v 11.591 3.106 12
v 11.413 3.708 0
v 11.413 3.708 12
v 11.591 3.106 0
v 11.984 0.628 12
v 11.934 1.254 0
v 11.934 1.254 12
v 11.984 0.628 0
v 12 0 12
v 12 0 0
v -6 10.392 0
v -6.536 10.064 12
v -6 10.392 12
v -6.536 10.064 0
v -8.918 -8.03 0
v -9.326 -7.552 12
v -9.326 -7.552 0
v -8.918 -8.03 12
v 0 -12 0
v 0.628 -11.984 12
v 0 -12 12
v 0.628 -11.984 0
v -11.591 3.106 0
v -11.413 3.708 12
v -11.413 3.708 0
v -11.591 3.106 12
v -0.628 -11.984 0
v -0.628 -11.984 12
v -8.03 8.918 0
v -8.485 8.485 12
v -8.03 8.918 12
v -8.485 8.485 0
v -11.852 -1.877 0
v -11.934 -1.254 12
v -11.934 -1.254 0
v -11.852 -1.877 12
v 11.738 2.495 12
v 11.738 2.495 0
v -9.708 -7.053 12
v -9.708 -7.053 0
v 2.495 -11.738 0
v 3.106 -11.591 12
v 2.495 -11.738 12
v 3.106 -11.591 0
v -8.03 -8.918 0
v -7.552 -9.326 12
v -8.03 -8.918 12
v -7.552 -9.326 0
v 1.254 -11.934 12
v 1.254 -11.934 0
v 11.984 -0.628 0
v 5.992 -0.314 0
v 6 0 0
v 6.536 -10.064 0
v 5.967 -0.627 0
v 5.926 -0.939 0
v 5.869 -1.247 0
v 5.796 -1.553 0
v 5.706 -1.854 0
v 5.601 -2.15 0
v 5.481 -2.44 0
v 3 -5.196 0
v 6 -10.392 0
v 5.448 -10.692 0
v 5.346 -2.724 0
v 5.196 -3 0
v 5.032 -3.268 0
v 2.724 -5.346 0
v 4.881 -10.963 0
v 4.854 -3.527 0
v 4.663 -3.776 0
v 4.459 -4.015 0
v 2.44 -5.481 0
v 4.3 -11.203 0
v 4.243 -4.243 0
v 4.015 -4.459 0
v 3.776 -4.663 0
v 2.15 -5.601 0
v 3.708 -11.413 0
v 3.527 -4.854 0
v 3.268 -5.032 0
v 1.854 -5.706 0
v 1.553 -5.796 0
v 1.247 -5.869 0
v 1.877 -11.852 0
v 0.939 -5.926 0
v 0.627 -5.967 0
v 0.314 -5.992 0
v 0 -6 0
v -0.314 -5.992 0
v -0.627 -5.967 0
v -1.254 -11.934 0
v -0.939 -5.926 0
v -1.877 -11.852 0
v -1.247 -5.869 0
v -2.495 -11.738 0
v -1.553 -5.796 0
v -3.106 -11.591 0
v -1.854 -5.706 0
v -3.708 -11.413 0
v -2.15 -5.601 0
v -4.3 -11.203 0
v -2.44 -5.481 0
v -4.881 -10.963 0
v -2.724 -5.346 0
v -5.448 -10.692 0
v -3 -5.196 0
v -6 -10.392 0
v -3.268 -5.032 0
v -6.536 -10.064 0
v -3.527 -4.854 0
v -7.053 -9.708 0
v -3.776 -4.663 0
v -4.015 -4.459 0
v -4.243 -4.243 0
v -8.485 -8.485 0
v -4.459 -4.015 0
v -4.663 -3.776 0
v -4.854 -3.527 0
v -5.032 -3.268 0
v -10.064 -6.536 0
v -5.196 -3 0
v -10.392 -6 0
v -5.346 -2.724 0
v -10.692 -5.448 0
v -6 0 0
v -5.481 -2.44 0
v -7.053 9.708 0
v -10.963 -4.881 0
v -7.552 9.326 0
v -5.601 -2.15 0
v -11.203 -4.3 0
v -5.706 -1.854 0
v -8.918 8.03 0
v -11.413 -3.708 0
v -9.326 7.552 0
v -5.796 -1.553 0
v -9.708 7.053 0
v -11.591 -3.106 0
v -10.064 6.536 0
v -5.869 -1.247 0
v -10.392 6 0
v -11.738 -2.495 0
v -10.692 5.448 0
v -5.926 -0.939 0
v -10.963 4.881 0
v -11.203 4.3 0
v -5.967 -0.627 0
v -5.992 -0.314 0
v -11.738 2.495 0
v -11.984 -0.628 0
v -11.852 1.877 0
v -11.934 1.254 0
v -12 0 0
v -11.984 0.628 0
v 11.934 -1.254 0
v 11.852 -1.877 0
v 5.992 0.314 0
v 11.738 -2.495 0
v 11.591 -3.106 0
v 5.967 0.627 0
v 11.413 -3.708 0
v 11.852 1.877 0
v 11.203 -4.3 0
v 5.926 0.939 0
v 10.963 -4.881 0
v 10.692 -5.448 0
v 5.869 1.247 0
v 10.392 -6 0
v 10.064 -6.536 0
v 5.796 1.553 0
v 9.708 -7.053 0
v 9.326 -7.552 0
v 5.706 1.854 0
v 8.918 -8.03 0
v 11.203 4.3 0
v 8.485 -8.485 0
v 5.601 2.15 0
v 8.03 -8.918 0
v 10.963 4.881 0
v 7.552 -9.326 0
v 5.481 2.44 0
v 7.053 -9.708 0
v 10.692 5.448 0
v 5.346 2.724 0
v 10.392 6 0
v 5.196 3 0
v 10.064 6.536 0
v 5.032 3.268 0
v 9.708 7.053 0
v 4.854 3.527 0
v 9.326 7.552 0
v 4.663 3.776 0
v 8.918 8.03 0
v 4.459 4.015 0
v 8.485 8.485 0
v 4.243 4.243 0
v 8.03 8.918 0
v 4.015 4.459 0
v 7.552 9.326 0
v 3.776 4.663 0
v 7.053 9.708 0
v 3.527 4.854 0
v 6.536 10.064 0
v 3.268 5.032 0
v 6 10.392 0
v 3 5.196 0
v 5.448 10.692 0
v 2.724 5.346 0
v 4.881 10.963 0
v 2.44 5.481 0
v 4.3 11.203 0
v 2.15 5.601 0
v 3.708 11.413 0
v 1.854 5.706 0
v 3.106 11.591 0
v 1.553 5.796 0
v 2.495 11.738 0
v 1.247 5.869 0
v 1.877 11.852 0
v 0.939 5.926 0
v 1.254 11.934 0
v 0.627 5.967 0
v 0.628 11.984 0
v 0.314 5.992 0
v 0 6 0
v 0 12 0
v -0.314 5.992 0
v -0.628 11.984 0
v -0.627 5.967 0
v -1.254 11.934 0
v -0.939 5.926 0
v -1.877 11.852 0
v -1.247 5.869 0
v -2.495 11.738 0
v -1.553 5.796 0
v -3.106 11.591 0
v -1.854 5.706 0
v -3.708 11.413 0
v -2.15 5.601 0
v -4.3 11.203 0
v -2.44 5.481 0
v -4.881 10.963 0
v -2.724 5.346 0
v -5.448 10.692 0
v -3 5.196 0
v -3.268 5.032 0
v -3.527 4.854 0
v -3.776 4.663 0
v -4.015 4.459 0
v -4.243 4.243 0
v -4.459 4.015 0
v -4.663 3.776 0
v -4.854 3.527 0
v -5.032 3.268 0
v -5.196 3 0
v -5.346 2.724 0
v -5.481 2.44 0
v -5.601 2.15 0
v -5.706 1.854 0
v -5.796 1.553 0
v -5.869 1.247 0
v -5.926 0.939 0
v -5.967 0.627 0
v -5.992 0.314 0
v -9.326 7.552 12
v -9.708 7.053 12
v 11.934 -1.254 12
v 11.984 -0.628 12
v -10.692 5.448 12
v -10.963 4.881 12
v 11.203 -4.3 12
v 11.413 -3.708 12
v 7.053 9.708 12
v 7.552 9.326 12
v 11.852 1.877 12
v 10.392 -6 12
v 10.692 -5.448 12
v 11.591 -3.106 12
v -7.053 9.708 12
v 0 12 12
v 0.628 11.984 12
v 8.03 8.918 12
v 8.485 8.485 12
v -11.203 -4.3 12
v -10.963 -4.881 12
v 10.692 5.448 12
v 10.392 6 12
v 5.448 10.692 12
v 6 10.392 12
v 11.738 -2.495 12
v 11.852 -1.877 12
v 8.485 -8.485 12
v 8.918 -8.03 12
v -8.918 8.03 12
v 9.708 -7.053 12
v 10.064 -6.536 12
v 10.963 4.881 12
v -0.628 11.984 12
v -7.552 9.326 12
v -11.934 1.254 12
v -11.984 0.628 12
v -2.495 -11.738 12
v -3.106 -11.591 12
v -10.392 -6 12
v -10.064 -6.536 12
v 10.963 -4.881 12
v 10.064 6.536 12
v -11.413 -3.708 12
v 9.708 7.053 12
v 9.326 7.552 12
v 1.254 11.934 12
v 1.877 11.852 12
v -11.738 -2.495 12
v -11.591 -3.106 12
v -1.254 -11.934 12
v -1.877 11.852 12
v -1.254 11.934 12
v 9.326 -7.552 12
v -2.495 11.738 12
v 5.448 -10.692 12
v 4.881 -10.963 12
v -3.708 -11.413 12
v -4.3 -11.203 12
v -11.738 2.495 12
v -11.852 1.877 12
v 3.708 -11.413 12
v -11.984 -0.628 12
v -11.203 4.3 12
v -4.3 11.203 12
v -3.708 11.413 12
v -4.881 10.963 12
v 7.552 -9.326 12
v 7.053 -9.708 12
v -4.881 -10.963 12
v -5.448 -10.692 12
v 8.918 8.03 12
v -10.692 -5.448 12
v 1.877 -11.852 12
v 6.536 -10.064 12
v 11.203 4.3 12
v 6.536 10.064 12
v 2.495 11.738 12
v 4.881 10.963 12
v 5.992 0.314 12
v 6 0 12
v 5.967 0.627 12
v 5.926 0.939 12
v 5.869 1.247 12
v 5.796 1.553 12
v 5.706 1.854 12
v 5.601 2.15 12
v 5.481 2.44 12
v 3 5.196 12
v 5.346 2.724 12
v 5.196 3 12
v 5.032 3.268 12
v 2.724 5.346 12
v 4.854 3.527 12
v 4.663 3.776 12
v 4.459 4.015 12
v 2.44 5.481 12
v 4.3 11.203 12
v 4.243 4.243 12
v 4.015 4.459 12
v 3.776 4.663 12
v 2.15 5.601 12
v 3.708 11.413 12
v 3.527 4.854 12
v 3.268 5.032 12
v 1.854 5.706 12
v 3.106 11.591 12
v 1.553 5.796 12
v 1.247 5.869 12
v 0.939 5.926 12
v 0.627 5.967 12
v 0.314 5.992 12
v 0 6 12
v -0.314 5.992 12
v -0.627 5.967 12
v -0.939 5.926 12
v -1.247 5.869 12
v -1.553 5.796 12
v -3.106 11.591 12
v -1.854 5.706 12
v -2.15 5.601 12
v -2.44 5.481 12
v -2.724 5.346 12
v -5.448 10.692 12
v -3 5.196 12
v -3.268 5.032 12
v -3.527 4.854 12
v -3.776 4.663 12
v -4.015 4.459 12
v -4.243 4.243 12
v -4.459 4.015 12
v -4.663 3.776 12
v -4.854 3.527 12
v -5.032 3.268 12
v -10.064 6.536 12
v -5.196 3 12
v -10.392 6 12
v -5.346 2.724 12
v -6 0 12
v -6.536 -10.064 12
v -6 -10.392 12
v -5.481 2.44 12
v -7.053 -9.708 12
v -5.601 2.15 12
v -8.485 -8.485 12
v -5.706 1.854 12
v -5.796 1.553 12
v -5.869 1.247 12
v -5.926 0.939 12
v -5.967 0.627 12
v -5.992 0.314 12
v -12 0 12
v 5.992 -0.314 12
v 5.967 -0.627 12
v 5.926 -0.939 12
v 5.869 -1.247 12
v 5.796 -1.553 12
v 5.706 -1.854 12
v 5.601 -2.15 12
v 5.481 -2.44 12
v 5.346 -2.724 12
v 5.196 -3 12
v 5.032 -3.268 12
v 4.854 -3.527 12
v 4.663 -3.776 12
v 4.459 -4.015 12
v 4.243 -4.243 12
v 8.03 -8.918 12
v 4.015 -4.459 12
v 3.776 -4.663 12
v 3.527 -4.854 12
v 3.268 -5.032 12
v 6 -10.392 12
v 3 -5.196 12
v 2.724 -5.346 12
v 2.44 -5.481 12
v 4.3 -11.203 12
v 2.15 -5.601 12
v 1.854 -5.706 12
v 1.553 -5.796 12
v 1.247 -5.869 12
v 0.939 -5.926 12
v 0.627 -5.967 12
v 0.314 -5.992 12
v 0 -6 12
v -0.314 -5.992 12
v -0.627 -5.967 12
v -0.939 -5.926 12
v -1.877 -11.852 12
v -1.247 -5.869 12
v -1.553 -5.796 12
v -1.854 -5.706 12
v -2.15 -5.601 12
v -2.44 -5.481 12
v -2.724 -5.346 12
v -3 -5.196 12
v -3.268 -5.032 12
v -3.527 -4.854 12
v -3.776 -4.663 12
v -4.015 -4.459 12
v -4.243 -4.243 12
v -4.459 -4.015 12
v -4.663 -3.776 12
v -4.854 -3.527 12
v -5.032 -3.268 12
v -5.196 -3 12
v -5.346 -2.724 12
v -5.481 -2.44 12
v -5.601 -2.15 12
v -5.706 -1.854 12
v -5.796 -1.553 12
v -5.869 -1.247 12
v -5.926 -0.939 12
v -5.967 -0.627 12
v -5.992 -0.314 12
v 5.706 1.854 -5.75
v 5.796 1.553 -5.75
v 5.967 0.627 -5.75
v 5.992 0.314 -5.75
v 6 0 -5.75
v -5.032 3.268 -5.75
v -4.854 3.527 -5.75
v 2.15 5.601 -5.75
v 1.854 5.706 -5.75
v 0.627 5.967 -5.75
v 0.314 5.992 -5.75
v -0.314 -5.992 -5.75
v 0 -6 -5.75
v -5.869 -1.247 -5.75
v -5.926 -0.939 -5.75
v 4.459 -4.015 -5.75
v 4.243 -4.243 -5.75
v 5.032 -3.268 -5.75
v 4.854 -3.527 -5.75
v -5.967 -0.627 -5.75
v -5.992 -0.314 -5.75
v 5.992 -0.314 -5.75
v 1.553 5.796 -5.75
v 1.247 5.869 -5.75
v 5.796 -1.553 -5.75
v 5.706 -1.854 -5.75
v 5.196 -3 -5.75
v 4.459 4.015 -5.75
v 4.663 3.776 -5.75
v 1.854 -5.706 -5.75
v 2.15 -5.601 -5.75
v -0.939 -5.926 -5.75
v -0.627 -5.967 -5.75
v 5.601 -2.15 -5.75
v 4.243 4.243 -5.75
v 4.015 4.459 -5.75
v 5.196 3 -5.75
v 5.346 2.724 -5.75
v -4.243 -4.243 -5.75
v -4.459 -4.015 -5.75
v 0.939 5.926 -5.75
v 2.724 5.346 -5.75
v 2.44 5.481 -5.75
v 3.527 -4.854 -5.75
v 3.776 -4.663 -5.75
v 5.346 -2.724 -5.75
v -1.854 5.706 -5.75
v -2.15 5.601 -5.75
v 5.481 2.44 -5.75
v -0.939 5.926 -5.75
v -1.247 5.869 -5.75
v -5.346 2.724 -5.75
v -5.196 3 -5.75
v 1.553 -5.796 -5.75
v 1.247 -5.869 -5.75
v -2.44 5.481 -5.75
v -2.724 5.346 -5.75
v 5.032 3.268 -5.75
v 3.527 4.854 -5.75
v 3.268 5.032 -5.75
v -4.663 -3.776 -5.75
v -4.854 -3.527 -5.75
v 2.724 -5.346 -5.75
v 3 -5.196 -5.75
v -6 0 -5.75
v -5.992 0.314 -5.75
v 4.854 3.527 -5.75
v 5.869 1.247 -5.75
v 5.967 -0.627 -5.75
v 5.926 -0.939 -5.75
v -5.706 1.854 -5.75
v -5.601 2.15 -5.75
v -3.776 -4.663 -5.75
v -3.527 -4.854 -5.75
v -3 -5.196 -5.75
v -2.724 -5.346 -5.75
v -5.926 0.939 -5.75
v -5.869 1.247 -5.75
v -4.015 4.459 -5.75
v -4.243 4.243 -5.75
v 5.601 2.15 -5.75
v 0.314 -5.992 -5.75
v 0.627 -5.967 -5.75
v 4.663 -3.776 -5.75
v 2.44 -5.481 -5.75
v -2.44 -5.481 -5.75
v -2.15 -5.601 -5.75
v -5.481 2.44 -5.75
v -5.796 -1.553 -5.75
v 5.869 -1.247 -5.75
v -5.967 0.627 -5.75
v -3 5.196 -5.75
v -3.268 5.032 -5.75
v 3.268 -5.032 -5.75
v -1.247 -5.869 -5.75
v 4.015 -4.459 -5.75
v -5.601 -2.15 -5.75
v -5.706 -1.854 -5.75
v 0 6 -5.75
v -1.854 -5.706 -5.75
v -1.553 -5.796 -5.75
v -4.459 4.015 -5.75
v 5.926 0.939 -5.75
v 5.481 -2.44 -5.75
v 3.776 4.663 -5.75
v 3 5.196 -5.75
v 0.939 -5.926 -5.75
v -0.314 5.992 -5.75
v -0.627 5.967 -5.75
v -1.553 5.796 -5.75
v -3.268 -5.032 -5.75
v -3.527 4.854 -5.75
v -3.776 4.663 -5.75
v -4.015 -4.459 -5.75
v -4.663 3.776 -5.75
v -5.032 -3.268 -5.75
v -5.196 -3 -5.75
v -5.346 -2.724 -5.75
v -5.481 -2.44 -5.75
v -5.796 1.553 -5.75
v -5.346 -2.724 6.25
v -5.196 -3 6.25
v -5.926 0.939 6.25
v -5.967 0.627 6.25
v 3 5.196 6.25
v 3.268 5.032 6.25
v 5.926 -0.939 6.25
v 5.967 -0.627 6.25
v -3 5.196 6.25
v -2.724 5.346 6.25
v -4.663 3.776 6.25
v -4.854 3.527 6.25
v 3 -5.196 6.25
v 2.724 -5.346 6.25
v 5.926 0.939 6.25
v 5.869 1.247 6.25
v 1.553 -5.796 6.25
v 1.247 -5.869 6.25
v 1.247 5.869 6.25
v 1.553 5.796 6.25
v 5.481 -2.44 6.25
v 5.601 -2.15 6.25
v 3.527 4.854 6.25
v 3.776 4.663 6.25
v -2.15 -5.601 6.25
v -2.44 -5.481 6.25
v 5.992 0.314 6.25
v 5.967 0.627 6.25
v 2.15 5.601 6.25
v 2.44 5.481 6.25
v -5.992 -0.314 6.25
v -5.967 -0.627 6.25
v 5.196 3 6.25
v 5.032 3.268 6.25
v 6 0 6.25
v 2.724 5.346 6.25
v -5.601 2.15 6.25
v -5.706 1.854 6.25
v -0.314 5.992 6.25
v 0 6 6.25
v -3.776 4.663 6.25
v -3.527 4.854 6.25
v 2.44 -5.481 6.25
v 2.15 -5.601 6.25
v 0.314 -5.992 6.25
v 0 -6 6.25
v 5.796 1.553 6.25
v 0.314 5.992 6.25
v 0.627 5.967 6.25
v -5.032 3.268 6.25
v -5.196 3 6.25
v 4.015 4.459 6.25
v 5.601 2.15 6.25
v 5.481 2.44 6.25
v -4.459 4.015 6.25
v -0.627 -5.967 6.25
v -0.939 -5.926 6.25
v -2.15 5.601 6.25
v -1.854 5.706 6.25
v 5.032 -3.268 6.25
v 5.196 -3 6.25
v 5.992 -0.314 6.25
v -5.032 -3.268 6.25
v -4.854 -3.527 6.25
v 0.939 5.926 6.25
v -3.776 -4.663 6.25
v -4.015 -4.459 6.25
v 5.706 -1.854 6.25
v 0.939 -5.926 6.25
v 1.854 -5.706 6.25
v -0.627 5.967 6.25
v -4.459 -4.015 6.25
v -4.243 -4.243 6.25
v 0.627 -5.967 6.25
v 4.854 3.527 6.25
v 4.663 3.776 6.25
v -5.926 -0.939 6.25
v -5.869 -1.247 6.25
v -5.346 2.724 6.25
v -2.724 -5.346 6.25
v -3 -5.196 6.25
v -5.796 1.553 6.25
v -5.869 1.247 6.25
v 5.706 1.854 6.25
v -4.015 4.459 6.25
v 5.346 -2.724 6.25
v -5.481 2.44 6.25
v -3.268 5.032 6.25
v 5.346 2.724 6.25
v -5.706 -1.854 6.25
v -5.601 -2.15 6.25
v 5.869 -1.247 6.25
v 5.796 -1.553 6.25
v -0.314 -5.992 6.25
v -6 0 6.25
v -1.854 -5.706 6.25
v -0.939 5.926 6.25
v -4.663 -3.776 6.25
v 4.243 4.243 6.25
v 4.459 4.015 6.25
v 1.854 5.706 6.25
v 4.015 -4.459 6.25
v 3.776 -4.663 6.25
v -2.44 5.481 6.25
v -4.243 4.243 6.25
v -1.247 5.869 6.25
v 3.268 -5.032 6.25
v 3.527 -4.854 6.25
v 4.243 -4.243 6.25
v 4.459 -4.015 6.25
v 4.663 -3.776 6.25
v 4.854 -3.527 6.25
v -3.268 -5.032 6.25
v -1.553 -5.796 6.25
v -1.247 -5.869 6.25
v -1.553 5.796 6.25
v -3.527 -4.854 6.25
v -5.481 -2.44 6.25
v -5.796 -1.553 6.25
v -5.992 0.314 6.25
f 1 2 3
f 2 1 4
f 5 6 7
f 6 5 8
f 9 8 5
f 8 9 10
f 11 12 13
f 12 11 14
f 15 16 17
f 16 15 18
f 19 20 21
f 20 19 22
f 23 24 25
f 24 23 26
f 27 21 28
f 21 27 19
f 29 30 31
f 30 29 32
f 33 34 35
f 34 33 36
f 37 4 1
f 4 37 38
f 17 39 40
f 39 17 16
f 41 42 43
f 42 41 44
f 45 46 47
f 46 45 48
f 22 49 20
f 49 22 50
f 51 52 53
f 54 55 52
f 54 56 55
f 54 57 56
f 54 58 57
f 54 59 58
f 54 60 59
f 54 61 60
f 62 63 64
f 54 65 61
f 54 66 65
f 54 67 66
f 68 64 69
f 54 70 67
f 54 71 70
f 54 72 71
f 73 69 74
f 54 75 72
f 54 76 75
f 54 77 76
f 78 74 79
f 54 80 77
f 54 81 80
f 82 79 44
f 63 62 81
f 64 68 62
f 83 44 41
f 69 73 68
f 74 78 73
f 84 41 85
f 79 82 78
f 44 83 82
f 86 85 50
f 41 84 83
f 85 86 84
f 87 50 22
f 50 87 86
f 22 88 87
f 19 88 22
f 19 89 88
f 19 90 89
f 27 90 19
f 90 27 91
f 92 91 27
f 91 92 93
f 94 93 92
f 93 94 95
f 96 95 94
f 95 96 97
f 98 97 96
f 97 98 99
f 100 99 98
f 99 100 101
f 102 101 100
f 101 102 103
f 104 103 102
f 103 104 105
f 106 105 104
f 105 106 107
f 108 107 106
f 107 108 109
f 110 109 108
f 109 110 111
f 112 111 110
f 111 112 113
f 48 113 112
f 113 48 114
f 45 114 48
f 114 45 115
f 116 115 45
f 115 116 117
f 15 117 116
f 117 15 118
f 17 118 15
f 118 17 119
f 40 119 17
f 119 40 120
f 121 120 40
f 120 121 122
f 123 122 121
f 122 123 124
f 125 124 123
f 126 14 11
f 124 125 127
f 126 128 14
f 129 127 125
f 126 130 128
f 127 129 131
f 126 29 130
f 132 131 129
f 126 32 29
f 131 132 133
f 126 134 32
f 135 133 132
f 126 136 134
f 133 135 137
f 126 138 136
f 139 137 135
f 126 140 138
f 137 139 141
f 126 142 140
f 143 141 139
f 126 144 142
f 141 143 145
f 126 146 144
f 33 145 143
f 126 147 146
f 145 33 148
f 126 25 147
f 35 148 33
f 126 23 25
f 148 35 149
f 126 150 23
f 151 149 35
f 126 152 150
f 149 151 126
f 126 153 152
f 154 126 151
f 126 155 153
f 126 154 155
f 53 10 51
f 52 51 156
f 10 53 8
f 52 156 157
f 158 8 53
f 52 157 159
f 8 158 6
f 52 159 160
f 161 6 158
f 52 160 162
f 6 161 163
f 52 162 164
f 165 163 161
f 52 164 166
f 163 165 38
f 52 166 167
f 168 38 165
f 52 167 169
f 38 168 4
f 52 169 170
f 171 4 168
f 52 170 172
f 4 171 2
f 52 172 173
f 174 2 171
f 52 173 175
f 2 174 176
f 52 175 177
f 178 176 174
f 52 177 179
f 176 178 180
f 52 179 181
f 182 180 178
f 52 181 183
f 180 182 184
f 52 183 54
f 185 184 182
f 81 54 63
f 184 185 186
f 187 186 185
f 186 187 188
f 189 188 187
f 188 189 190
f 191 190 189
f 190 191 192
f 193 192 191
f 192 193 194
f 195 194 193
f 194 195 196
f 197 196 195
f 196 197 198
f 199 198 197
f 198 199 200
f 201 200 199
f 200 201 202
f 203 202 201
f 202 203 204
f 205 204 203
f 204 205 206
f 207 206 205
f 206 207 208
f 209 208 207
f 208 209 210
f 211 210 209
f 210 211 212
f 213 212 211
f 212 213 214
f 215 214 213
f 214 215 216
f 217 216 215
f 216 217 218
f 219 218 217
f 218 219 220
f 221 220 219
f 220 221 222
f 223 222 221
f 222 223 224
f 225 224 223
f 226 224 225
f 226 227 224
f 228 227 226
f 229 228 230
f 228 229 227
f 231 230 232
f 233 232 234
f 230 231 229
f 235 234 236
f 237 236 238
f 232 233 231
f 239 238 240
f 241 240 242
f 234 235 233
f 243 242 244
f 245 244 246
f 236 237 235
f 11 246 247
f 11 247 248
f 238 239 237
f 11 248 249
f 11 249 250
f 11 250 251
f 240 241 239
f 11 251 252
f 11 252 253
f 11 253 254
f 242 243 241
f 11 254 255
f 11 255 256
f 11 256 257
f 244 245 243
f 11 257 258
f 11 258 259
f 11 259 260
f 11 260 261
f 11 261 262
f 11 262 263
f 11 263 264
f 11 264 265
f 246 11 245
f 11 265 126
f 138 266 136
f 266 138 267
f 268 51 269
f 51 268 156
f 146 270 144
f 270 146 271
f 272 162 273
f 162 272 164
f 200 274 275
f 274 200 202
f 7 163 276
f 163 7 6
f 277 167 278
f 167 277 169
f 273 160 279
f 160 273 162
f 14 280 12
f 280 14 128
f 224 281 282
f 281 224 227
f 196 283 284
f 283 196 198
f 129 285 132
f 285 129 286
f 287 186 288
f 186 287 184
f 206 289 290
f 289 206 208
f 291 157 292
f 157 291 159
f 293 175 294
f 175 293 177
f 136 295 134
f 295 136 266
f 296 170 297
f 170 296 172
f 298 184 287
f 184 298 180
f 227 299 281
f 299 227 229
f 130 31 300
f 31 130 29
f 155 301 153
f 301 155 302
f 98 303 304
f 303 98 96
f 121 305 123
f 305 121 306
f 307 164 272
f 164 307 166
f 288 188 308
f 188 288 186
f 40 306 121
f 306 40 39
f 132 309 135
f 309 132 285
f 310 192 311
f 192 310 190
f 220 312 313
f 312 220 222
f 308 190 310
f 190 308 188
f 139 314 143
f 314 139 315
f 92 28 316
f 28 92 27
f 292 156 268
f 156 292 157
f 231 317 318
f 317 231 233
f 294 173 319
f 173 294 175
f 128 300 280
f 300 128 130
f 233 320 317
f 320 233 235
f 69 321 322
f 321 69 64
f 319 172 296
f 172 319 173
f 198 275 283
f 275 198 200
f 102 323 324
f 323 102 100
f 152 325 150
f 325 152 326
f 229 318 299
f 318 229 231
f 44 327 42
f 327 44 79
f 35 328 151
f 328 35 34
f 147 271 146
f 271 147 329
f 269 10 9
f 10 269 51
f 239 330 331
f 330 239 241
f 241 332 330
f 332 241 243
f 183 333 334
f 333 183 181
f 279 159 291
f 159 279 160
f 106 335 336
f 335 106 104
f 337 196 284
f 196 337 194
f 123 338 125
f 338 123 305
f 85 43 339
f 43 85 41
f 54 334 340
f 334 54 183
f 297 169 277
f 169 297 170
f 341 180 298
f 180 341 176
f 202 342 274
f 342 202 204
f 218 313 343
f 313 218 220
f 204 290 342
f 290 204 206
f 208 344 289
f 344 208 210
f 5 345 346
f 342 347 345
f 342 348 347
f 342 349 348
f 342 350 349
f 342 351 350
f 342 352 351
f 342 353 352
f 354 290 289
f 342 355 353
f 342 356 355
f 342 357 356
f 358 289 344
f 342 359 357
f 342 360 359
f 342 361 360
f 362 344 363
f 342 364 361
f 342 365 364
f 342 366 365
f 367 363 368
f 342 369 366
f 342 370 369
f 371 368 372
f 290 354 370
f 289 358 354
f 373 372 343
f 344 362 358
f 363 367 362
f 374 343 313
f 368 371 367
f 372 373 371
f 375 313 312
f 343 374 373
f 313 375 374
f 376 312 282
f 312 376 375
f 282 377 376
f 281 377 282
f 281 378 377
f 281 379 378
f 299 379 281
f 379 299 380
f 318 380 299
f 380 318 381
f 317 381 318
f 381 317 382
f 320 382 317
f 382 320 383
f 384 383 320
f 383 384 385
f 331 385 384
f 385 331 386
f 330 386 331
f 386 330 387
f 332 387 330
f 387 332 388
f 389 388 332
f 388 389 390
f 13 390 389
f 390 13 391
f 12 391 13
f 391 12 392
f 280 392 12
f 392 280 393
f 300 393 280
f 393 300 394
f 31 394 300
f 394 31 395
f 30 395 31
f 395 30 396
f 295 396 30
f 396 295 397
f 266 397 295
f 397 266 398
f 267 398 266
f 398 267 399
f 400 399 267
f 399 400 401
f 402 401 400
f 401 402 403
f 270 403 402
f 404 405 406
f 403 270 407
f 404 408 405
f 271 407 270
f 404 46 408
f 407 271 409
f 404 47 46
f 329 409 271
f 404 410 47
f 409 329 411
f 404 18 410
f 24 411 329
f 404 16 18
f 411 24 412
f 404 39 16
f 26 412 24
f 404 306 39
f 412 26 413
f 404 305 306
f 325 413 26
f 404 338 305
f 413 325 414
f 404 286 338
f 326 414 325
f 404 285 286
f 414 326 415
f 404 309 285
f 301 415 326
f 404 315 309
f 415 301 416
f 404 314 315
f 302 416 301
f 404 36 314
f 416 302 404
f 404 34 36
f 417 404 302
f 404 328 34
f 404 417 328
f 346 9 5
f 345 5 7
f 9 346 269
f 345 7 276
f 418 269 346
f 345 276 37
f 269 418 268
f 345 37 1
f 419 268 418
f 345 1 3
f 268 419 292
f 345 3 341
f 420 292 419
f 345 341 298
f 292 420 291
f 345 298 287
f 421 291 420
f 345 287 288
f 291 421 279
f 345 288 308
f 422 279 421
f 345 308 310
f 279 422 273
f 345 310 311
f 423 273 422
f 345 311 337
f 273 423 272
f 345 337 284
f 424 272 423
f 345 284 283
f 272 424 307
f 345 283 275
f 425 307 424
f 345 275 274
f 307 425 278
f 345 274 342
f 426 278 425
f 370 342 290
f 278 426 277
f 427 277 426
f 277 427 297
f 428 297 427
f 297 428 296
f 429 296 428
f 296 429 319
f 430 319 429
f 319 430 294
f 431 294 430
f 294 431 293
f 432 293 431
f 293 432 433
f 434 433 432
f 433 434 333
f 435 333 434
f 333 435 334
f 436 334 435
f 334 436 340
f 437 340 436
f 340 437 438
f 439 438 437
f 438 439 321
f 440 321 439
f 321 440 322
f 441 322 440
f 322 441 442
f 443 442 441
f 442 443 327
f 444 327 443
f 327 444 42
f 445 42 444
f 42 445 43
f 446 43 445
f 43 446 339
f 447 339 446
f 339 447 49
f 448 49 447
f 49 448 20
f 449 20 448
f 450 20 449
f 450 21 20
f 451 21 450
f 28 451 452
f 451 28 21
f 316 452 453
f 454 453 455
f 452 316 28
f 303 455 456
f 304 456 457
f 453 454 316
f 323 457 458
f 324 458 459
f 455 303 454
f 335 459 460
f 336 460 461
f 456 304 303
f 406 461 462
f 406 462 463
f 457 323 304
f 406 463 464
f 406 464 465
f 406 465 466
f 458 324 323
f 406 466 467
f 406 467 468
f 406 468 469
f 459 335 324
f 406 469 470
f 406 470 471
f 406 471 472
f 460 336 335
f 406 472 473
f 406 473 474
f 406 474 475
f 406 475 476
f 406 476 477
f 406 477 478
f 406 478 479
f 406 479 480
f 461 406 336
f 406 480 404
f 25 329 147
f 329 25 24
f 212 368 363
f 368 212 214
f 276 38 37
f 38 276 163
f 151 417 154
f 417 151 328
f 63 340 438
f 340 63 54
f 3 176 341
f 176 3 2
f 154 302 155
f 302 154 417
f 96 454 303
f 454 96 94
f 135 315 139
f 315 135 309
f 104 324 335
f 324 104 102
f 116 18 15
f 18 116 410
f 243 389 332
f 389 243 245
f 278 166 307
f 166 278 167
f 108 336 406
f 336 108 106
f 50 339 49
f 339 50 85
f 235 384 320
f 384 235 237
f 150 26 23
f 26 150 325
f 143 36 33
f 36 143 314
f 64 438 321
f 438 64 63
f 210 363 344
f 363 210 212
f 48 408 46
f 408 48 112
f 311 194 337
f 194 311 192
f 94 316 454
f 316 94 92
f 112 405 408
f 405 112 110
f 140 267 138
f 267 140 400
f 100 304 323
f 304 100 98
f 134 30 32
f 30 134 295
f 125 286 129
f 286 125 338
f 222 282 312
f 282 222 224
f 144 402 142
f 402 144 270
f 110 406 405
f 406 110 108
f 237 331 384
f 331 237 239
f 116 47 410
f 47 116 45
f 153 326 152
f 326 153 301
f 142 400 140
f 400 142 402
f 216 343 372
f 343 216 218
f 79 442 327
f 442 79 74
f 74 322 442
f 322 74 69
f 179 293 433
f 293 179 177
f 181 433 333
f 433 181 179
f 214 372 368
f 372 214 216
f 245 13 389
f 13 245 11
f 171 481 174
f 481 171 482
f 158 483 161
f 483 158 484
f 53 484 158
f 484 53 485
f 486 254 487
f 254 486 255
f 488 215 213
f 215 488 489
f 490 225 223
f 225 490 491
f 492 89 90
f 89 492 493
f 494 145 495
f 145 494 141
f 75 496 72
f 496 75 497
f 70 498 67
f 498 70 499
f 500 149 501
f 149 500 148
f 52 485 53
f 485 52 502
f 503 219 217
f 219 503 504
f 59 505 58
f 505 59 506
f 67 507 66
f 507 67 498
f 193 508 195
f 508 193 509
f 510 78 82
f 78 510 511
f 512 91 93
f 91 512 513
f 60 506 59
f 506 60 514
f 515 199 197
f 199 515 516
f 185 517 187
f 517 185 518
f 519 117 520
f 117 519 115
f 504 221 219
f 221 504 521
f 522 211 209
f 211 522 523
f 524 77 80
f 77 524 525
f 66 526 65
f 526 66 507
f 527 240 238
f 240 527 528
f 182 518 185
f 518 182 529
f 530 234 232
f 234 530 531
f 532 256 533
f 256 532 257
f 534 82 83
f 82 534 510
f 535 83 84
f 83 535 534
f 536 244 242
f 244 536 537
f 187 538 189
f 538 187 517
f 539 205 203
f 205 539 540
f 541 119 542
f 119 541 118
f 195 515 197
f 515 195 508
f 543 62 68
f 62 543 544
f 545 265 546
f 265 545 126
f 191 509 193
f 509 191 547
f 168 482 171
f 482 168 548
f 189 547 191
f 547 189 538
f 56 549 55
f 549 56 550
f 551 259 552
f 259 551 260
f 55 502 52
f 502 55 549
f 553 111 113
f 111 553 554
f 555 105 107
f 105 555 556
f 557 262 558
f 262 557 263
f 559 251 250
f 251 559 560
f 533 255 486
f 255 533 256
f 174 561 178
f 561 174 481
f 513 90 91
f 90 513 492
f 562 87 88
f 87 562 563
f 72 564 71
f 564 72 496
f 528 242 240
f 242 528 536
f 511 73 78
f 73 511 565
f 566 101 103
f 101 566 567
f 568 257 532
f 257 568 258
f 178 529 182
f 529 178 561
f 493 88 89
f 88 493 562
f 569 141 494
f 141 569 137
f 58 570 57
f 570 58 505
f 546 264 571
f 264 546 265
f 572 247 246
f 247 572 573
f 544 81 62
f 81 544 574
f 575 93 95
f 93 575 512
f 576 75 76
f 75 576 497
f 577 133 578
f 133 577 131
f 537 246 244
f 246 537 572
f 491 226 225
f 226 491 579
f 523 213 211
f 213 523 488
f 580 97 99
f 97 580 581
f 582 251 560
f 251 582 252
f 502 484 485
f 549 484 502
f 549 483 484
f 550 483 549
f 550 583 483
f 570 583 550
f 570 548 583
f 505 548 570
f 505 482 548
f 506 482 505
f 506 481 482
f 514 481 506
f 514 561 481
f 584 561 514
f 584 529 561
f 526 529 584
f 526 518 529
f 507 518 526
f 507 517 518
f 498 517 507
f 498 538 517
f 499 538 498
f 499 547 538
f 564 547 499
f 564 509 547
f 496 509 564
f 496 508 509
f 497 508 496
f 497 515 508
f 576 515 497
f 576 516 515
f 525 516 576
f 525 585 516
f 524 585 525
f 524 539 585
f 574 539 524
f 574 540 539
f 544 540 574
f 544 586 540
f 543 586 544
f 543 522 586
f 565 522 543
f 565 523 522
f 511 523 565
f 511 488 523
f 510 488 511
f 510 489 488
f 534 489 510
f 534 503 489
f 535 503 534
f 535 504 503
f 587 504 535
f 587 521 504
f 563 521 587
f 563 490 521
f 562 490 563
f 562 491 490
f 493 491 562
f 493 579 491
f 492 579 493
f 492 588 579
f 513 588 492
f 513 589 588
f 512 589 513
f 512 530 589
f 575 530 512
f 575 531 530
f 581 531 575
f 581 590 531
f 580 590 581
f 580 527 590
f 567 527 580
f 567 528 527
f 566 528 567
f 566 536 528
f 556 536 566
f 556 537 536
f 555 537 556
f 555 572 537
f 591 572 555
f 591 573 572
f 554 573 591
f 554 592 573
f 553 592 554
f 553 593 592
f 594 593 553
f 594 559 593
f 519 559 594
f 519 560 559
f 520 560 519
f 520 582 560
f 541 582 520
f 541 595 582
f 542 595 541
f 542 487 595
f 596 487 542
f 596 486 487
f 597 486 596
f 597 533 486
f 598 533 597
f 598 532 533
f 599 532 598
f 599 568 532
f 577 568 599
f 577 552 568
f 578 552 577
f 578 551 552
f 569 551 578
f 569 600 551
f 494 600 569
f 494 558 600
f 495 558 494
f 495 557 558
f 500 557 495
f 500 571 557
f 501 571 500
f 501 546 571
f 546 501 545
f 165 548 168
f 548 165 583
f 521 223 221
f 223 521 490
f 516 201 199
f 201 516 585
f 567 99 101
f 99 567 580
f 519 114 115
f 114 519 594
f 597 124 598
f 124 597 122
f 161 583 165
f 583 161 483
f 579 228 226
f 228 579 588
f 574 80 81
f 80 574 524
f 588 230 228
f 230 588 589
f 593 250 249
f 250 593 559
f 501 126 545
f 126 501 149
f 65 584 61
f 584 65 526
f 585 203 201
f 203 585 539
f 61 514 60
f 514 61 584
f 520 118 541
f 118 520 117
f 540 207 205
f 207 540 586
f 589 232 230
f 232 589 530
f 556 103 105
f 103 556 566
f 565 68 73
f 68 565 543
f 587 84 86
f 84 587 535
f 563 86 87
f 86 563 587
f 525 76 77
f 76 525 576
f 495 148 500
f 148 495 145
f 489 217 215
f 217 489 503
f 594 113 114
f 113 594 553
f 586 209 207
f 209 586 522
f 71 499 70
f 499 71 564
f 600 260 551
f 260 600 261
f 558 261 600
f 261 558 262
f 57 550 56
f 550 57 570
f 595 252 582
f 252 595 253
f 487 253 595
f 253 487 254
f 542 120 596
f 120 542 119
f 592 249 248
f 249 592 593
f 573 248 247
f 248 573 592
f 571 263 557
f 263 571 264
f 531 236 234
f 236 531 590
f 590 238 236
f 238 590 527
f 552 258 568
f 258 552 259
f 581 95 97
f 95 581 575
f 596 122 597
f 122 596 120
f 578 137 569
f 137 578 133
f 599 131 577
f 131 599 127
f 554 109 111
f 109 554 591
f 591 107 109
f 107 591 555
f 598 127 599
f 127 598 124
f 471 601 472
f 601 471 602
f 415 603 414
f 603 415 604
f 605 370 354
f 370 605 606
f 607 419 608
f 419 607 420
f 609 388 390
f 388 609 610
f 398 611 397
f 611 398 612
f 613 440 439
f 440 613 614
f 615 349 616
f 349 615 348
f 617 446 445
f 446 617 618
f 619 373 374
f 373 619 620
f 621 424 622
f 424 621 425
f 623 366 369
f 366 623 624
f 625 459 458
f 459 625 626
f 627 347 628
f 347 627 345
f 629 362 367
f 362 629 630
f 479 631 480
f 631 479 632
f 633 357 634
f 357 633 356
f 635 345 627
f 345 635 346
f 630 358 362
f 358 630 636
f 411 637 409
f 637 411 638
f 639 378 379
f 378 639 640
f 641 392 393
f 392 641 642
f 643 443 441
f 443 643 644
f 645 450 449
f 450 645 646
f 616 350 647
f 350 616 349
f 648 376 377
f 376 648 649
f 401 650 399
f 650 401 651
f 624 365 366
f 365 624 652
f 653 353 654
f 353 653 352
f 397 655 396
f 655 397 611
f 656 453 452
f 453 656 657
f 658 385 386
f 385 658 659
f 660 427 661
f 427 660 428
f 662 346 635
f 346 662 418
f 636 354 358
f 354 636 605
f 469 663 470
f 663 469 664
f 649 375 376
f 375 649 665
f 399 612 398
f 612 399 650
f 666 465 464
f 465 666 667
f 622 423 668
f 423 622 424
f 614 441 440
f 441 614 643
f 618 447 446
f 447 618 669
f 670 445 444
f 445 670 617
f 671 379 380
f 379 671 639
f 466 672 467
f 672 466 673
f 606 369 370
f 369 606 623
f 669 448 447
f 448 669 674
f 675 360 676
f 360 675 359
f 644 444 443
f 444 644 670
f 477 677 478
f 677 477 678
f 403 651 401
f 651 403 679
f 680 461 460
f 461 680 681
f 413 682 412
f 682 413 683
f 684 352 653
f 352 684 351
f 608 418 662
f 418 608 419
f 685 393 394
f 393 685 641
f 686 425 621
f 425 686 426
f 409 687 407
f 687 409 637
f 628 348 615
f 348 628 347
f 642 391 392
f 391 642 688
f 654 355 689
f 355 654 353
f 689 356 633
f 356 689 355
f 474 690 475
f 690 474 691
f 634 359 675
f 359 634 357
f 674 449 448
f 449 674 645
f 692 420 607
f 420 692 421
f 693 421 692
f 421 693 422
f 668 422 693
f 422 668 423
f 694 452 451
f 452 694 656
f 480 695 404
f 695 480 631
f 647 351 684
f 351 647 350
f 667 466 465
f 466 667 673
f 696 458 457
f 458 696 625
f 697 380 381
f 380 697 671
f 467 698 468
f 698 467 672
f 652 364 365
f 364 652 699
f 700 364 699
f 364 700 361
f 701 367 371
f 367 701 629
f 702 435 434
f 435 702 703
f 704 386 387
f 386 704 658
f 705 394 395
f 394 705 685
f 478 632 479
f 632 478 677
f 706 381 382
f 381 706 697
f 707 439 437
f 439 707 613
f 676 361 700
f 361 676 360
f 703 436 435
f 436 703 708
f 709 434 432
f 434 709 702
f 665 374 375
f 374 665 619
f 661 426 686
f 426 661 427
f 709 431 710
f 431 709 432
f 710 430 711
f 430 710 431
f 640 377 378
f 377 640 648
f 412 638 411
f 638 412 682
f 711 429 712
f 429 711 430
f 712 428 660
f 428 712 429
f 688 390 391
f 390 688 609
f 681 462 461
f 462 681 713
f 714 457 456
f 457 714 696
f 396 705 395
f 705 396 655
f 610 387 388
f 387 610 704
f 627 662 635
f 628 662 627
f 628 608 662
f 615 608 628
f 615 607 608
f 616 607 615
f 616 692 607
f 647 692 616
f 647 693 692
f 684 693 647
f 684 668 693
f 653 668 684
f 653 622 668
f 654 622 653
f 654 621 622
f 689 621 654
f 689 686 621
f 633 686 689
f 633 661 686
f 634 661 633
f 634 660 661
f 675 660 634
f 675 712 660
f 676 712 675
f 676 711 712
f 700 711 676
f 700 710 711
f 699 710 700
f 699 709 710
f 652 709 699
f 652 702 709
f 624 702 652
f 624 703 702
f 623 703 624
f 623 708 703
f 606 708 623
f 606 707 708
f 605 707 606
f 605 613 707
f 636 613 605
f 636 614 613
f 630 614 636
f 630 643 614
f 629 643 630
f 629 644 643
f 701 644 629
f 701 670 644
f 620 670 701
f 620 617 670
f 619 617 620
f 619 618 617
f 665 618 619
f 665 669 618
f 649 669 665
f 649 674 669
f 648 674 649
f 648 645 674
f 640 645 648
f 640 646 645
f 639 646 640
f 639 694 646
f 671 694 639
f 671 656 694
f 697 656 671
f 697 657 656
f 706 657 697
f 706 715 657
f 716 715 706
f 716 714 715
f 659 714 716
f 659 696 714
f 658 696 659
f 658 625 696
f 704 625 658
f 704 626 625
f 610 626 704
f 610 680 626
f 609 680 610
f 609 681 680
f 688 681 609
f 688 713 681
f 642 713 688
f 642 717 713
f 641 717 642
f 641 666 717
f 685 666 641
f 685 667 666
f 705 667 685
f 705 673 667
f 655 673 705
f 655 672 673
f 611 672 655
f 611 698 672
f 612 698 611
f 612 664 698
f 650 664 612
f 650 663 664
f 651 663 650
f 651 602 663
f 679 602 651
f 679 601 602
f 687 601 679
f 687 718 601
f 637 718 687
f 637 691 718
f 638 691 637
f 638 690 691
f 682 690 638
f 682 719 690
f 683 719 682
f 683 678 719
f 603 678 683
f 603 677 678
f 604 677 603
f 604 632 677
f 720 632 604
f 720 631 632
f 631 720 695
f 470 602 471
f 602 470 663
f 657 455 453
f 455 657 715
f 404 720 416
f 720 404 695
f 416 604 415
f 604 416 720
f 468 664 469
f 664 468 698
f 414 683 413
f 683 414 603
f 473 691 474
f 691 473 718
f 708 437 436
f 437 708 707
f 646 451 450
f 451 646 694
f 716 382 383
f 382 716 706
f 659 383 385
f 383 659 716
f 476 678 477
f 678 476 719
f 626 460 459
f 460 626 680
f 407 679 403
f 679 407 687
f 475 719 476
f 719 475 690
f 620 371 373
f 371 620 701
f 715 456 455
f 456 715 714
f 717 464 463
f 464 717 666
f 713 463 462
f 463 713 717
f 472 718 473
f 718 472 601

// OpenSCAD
hole_h = 5.75;
hole_r = 6;

outter_h = 12;
outter_r = hole_r * 2;

roundness = 120;

difference() {
    union() {
        cylinder(h = outter_h, r = outter_r, $fn = roundness);
        translate([0, 0, -hole_h]) {
            cylinder(h = hole_h, r = hole_r, $fn = roundness);
        }
    }
    translate([0, 0, (outter_h - hole_h)]) {
        cylinder(h = hole_h, r = hole_r, $fn = roundness);
    }
}
